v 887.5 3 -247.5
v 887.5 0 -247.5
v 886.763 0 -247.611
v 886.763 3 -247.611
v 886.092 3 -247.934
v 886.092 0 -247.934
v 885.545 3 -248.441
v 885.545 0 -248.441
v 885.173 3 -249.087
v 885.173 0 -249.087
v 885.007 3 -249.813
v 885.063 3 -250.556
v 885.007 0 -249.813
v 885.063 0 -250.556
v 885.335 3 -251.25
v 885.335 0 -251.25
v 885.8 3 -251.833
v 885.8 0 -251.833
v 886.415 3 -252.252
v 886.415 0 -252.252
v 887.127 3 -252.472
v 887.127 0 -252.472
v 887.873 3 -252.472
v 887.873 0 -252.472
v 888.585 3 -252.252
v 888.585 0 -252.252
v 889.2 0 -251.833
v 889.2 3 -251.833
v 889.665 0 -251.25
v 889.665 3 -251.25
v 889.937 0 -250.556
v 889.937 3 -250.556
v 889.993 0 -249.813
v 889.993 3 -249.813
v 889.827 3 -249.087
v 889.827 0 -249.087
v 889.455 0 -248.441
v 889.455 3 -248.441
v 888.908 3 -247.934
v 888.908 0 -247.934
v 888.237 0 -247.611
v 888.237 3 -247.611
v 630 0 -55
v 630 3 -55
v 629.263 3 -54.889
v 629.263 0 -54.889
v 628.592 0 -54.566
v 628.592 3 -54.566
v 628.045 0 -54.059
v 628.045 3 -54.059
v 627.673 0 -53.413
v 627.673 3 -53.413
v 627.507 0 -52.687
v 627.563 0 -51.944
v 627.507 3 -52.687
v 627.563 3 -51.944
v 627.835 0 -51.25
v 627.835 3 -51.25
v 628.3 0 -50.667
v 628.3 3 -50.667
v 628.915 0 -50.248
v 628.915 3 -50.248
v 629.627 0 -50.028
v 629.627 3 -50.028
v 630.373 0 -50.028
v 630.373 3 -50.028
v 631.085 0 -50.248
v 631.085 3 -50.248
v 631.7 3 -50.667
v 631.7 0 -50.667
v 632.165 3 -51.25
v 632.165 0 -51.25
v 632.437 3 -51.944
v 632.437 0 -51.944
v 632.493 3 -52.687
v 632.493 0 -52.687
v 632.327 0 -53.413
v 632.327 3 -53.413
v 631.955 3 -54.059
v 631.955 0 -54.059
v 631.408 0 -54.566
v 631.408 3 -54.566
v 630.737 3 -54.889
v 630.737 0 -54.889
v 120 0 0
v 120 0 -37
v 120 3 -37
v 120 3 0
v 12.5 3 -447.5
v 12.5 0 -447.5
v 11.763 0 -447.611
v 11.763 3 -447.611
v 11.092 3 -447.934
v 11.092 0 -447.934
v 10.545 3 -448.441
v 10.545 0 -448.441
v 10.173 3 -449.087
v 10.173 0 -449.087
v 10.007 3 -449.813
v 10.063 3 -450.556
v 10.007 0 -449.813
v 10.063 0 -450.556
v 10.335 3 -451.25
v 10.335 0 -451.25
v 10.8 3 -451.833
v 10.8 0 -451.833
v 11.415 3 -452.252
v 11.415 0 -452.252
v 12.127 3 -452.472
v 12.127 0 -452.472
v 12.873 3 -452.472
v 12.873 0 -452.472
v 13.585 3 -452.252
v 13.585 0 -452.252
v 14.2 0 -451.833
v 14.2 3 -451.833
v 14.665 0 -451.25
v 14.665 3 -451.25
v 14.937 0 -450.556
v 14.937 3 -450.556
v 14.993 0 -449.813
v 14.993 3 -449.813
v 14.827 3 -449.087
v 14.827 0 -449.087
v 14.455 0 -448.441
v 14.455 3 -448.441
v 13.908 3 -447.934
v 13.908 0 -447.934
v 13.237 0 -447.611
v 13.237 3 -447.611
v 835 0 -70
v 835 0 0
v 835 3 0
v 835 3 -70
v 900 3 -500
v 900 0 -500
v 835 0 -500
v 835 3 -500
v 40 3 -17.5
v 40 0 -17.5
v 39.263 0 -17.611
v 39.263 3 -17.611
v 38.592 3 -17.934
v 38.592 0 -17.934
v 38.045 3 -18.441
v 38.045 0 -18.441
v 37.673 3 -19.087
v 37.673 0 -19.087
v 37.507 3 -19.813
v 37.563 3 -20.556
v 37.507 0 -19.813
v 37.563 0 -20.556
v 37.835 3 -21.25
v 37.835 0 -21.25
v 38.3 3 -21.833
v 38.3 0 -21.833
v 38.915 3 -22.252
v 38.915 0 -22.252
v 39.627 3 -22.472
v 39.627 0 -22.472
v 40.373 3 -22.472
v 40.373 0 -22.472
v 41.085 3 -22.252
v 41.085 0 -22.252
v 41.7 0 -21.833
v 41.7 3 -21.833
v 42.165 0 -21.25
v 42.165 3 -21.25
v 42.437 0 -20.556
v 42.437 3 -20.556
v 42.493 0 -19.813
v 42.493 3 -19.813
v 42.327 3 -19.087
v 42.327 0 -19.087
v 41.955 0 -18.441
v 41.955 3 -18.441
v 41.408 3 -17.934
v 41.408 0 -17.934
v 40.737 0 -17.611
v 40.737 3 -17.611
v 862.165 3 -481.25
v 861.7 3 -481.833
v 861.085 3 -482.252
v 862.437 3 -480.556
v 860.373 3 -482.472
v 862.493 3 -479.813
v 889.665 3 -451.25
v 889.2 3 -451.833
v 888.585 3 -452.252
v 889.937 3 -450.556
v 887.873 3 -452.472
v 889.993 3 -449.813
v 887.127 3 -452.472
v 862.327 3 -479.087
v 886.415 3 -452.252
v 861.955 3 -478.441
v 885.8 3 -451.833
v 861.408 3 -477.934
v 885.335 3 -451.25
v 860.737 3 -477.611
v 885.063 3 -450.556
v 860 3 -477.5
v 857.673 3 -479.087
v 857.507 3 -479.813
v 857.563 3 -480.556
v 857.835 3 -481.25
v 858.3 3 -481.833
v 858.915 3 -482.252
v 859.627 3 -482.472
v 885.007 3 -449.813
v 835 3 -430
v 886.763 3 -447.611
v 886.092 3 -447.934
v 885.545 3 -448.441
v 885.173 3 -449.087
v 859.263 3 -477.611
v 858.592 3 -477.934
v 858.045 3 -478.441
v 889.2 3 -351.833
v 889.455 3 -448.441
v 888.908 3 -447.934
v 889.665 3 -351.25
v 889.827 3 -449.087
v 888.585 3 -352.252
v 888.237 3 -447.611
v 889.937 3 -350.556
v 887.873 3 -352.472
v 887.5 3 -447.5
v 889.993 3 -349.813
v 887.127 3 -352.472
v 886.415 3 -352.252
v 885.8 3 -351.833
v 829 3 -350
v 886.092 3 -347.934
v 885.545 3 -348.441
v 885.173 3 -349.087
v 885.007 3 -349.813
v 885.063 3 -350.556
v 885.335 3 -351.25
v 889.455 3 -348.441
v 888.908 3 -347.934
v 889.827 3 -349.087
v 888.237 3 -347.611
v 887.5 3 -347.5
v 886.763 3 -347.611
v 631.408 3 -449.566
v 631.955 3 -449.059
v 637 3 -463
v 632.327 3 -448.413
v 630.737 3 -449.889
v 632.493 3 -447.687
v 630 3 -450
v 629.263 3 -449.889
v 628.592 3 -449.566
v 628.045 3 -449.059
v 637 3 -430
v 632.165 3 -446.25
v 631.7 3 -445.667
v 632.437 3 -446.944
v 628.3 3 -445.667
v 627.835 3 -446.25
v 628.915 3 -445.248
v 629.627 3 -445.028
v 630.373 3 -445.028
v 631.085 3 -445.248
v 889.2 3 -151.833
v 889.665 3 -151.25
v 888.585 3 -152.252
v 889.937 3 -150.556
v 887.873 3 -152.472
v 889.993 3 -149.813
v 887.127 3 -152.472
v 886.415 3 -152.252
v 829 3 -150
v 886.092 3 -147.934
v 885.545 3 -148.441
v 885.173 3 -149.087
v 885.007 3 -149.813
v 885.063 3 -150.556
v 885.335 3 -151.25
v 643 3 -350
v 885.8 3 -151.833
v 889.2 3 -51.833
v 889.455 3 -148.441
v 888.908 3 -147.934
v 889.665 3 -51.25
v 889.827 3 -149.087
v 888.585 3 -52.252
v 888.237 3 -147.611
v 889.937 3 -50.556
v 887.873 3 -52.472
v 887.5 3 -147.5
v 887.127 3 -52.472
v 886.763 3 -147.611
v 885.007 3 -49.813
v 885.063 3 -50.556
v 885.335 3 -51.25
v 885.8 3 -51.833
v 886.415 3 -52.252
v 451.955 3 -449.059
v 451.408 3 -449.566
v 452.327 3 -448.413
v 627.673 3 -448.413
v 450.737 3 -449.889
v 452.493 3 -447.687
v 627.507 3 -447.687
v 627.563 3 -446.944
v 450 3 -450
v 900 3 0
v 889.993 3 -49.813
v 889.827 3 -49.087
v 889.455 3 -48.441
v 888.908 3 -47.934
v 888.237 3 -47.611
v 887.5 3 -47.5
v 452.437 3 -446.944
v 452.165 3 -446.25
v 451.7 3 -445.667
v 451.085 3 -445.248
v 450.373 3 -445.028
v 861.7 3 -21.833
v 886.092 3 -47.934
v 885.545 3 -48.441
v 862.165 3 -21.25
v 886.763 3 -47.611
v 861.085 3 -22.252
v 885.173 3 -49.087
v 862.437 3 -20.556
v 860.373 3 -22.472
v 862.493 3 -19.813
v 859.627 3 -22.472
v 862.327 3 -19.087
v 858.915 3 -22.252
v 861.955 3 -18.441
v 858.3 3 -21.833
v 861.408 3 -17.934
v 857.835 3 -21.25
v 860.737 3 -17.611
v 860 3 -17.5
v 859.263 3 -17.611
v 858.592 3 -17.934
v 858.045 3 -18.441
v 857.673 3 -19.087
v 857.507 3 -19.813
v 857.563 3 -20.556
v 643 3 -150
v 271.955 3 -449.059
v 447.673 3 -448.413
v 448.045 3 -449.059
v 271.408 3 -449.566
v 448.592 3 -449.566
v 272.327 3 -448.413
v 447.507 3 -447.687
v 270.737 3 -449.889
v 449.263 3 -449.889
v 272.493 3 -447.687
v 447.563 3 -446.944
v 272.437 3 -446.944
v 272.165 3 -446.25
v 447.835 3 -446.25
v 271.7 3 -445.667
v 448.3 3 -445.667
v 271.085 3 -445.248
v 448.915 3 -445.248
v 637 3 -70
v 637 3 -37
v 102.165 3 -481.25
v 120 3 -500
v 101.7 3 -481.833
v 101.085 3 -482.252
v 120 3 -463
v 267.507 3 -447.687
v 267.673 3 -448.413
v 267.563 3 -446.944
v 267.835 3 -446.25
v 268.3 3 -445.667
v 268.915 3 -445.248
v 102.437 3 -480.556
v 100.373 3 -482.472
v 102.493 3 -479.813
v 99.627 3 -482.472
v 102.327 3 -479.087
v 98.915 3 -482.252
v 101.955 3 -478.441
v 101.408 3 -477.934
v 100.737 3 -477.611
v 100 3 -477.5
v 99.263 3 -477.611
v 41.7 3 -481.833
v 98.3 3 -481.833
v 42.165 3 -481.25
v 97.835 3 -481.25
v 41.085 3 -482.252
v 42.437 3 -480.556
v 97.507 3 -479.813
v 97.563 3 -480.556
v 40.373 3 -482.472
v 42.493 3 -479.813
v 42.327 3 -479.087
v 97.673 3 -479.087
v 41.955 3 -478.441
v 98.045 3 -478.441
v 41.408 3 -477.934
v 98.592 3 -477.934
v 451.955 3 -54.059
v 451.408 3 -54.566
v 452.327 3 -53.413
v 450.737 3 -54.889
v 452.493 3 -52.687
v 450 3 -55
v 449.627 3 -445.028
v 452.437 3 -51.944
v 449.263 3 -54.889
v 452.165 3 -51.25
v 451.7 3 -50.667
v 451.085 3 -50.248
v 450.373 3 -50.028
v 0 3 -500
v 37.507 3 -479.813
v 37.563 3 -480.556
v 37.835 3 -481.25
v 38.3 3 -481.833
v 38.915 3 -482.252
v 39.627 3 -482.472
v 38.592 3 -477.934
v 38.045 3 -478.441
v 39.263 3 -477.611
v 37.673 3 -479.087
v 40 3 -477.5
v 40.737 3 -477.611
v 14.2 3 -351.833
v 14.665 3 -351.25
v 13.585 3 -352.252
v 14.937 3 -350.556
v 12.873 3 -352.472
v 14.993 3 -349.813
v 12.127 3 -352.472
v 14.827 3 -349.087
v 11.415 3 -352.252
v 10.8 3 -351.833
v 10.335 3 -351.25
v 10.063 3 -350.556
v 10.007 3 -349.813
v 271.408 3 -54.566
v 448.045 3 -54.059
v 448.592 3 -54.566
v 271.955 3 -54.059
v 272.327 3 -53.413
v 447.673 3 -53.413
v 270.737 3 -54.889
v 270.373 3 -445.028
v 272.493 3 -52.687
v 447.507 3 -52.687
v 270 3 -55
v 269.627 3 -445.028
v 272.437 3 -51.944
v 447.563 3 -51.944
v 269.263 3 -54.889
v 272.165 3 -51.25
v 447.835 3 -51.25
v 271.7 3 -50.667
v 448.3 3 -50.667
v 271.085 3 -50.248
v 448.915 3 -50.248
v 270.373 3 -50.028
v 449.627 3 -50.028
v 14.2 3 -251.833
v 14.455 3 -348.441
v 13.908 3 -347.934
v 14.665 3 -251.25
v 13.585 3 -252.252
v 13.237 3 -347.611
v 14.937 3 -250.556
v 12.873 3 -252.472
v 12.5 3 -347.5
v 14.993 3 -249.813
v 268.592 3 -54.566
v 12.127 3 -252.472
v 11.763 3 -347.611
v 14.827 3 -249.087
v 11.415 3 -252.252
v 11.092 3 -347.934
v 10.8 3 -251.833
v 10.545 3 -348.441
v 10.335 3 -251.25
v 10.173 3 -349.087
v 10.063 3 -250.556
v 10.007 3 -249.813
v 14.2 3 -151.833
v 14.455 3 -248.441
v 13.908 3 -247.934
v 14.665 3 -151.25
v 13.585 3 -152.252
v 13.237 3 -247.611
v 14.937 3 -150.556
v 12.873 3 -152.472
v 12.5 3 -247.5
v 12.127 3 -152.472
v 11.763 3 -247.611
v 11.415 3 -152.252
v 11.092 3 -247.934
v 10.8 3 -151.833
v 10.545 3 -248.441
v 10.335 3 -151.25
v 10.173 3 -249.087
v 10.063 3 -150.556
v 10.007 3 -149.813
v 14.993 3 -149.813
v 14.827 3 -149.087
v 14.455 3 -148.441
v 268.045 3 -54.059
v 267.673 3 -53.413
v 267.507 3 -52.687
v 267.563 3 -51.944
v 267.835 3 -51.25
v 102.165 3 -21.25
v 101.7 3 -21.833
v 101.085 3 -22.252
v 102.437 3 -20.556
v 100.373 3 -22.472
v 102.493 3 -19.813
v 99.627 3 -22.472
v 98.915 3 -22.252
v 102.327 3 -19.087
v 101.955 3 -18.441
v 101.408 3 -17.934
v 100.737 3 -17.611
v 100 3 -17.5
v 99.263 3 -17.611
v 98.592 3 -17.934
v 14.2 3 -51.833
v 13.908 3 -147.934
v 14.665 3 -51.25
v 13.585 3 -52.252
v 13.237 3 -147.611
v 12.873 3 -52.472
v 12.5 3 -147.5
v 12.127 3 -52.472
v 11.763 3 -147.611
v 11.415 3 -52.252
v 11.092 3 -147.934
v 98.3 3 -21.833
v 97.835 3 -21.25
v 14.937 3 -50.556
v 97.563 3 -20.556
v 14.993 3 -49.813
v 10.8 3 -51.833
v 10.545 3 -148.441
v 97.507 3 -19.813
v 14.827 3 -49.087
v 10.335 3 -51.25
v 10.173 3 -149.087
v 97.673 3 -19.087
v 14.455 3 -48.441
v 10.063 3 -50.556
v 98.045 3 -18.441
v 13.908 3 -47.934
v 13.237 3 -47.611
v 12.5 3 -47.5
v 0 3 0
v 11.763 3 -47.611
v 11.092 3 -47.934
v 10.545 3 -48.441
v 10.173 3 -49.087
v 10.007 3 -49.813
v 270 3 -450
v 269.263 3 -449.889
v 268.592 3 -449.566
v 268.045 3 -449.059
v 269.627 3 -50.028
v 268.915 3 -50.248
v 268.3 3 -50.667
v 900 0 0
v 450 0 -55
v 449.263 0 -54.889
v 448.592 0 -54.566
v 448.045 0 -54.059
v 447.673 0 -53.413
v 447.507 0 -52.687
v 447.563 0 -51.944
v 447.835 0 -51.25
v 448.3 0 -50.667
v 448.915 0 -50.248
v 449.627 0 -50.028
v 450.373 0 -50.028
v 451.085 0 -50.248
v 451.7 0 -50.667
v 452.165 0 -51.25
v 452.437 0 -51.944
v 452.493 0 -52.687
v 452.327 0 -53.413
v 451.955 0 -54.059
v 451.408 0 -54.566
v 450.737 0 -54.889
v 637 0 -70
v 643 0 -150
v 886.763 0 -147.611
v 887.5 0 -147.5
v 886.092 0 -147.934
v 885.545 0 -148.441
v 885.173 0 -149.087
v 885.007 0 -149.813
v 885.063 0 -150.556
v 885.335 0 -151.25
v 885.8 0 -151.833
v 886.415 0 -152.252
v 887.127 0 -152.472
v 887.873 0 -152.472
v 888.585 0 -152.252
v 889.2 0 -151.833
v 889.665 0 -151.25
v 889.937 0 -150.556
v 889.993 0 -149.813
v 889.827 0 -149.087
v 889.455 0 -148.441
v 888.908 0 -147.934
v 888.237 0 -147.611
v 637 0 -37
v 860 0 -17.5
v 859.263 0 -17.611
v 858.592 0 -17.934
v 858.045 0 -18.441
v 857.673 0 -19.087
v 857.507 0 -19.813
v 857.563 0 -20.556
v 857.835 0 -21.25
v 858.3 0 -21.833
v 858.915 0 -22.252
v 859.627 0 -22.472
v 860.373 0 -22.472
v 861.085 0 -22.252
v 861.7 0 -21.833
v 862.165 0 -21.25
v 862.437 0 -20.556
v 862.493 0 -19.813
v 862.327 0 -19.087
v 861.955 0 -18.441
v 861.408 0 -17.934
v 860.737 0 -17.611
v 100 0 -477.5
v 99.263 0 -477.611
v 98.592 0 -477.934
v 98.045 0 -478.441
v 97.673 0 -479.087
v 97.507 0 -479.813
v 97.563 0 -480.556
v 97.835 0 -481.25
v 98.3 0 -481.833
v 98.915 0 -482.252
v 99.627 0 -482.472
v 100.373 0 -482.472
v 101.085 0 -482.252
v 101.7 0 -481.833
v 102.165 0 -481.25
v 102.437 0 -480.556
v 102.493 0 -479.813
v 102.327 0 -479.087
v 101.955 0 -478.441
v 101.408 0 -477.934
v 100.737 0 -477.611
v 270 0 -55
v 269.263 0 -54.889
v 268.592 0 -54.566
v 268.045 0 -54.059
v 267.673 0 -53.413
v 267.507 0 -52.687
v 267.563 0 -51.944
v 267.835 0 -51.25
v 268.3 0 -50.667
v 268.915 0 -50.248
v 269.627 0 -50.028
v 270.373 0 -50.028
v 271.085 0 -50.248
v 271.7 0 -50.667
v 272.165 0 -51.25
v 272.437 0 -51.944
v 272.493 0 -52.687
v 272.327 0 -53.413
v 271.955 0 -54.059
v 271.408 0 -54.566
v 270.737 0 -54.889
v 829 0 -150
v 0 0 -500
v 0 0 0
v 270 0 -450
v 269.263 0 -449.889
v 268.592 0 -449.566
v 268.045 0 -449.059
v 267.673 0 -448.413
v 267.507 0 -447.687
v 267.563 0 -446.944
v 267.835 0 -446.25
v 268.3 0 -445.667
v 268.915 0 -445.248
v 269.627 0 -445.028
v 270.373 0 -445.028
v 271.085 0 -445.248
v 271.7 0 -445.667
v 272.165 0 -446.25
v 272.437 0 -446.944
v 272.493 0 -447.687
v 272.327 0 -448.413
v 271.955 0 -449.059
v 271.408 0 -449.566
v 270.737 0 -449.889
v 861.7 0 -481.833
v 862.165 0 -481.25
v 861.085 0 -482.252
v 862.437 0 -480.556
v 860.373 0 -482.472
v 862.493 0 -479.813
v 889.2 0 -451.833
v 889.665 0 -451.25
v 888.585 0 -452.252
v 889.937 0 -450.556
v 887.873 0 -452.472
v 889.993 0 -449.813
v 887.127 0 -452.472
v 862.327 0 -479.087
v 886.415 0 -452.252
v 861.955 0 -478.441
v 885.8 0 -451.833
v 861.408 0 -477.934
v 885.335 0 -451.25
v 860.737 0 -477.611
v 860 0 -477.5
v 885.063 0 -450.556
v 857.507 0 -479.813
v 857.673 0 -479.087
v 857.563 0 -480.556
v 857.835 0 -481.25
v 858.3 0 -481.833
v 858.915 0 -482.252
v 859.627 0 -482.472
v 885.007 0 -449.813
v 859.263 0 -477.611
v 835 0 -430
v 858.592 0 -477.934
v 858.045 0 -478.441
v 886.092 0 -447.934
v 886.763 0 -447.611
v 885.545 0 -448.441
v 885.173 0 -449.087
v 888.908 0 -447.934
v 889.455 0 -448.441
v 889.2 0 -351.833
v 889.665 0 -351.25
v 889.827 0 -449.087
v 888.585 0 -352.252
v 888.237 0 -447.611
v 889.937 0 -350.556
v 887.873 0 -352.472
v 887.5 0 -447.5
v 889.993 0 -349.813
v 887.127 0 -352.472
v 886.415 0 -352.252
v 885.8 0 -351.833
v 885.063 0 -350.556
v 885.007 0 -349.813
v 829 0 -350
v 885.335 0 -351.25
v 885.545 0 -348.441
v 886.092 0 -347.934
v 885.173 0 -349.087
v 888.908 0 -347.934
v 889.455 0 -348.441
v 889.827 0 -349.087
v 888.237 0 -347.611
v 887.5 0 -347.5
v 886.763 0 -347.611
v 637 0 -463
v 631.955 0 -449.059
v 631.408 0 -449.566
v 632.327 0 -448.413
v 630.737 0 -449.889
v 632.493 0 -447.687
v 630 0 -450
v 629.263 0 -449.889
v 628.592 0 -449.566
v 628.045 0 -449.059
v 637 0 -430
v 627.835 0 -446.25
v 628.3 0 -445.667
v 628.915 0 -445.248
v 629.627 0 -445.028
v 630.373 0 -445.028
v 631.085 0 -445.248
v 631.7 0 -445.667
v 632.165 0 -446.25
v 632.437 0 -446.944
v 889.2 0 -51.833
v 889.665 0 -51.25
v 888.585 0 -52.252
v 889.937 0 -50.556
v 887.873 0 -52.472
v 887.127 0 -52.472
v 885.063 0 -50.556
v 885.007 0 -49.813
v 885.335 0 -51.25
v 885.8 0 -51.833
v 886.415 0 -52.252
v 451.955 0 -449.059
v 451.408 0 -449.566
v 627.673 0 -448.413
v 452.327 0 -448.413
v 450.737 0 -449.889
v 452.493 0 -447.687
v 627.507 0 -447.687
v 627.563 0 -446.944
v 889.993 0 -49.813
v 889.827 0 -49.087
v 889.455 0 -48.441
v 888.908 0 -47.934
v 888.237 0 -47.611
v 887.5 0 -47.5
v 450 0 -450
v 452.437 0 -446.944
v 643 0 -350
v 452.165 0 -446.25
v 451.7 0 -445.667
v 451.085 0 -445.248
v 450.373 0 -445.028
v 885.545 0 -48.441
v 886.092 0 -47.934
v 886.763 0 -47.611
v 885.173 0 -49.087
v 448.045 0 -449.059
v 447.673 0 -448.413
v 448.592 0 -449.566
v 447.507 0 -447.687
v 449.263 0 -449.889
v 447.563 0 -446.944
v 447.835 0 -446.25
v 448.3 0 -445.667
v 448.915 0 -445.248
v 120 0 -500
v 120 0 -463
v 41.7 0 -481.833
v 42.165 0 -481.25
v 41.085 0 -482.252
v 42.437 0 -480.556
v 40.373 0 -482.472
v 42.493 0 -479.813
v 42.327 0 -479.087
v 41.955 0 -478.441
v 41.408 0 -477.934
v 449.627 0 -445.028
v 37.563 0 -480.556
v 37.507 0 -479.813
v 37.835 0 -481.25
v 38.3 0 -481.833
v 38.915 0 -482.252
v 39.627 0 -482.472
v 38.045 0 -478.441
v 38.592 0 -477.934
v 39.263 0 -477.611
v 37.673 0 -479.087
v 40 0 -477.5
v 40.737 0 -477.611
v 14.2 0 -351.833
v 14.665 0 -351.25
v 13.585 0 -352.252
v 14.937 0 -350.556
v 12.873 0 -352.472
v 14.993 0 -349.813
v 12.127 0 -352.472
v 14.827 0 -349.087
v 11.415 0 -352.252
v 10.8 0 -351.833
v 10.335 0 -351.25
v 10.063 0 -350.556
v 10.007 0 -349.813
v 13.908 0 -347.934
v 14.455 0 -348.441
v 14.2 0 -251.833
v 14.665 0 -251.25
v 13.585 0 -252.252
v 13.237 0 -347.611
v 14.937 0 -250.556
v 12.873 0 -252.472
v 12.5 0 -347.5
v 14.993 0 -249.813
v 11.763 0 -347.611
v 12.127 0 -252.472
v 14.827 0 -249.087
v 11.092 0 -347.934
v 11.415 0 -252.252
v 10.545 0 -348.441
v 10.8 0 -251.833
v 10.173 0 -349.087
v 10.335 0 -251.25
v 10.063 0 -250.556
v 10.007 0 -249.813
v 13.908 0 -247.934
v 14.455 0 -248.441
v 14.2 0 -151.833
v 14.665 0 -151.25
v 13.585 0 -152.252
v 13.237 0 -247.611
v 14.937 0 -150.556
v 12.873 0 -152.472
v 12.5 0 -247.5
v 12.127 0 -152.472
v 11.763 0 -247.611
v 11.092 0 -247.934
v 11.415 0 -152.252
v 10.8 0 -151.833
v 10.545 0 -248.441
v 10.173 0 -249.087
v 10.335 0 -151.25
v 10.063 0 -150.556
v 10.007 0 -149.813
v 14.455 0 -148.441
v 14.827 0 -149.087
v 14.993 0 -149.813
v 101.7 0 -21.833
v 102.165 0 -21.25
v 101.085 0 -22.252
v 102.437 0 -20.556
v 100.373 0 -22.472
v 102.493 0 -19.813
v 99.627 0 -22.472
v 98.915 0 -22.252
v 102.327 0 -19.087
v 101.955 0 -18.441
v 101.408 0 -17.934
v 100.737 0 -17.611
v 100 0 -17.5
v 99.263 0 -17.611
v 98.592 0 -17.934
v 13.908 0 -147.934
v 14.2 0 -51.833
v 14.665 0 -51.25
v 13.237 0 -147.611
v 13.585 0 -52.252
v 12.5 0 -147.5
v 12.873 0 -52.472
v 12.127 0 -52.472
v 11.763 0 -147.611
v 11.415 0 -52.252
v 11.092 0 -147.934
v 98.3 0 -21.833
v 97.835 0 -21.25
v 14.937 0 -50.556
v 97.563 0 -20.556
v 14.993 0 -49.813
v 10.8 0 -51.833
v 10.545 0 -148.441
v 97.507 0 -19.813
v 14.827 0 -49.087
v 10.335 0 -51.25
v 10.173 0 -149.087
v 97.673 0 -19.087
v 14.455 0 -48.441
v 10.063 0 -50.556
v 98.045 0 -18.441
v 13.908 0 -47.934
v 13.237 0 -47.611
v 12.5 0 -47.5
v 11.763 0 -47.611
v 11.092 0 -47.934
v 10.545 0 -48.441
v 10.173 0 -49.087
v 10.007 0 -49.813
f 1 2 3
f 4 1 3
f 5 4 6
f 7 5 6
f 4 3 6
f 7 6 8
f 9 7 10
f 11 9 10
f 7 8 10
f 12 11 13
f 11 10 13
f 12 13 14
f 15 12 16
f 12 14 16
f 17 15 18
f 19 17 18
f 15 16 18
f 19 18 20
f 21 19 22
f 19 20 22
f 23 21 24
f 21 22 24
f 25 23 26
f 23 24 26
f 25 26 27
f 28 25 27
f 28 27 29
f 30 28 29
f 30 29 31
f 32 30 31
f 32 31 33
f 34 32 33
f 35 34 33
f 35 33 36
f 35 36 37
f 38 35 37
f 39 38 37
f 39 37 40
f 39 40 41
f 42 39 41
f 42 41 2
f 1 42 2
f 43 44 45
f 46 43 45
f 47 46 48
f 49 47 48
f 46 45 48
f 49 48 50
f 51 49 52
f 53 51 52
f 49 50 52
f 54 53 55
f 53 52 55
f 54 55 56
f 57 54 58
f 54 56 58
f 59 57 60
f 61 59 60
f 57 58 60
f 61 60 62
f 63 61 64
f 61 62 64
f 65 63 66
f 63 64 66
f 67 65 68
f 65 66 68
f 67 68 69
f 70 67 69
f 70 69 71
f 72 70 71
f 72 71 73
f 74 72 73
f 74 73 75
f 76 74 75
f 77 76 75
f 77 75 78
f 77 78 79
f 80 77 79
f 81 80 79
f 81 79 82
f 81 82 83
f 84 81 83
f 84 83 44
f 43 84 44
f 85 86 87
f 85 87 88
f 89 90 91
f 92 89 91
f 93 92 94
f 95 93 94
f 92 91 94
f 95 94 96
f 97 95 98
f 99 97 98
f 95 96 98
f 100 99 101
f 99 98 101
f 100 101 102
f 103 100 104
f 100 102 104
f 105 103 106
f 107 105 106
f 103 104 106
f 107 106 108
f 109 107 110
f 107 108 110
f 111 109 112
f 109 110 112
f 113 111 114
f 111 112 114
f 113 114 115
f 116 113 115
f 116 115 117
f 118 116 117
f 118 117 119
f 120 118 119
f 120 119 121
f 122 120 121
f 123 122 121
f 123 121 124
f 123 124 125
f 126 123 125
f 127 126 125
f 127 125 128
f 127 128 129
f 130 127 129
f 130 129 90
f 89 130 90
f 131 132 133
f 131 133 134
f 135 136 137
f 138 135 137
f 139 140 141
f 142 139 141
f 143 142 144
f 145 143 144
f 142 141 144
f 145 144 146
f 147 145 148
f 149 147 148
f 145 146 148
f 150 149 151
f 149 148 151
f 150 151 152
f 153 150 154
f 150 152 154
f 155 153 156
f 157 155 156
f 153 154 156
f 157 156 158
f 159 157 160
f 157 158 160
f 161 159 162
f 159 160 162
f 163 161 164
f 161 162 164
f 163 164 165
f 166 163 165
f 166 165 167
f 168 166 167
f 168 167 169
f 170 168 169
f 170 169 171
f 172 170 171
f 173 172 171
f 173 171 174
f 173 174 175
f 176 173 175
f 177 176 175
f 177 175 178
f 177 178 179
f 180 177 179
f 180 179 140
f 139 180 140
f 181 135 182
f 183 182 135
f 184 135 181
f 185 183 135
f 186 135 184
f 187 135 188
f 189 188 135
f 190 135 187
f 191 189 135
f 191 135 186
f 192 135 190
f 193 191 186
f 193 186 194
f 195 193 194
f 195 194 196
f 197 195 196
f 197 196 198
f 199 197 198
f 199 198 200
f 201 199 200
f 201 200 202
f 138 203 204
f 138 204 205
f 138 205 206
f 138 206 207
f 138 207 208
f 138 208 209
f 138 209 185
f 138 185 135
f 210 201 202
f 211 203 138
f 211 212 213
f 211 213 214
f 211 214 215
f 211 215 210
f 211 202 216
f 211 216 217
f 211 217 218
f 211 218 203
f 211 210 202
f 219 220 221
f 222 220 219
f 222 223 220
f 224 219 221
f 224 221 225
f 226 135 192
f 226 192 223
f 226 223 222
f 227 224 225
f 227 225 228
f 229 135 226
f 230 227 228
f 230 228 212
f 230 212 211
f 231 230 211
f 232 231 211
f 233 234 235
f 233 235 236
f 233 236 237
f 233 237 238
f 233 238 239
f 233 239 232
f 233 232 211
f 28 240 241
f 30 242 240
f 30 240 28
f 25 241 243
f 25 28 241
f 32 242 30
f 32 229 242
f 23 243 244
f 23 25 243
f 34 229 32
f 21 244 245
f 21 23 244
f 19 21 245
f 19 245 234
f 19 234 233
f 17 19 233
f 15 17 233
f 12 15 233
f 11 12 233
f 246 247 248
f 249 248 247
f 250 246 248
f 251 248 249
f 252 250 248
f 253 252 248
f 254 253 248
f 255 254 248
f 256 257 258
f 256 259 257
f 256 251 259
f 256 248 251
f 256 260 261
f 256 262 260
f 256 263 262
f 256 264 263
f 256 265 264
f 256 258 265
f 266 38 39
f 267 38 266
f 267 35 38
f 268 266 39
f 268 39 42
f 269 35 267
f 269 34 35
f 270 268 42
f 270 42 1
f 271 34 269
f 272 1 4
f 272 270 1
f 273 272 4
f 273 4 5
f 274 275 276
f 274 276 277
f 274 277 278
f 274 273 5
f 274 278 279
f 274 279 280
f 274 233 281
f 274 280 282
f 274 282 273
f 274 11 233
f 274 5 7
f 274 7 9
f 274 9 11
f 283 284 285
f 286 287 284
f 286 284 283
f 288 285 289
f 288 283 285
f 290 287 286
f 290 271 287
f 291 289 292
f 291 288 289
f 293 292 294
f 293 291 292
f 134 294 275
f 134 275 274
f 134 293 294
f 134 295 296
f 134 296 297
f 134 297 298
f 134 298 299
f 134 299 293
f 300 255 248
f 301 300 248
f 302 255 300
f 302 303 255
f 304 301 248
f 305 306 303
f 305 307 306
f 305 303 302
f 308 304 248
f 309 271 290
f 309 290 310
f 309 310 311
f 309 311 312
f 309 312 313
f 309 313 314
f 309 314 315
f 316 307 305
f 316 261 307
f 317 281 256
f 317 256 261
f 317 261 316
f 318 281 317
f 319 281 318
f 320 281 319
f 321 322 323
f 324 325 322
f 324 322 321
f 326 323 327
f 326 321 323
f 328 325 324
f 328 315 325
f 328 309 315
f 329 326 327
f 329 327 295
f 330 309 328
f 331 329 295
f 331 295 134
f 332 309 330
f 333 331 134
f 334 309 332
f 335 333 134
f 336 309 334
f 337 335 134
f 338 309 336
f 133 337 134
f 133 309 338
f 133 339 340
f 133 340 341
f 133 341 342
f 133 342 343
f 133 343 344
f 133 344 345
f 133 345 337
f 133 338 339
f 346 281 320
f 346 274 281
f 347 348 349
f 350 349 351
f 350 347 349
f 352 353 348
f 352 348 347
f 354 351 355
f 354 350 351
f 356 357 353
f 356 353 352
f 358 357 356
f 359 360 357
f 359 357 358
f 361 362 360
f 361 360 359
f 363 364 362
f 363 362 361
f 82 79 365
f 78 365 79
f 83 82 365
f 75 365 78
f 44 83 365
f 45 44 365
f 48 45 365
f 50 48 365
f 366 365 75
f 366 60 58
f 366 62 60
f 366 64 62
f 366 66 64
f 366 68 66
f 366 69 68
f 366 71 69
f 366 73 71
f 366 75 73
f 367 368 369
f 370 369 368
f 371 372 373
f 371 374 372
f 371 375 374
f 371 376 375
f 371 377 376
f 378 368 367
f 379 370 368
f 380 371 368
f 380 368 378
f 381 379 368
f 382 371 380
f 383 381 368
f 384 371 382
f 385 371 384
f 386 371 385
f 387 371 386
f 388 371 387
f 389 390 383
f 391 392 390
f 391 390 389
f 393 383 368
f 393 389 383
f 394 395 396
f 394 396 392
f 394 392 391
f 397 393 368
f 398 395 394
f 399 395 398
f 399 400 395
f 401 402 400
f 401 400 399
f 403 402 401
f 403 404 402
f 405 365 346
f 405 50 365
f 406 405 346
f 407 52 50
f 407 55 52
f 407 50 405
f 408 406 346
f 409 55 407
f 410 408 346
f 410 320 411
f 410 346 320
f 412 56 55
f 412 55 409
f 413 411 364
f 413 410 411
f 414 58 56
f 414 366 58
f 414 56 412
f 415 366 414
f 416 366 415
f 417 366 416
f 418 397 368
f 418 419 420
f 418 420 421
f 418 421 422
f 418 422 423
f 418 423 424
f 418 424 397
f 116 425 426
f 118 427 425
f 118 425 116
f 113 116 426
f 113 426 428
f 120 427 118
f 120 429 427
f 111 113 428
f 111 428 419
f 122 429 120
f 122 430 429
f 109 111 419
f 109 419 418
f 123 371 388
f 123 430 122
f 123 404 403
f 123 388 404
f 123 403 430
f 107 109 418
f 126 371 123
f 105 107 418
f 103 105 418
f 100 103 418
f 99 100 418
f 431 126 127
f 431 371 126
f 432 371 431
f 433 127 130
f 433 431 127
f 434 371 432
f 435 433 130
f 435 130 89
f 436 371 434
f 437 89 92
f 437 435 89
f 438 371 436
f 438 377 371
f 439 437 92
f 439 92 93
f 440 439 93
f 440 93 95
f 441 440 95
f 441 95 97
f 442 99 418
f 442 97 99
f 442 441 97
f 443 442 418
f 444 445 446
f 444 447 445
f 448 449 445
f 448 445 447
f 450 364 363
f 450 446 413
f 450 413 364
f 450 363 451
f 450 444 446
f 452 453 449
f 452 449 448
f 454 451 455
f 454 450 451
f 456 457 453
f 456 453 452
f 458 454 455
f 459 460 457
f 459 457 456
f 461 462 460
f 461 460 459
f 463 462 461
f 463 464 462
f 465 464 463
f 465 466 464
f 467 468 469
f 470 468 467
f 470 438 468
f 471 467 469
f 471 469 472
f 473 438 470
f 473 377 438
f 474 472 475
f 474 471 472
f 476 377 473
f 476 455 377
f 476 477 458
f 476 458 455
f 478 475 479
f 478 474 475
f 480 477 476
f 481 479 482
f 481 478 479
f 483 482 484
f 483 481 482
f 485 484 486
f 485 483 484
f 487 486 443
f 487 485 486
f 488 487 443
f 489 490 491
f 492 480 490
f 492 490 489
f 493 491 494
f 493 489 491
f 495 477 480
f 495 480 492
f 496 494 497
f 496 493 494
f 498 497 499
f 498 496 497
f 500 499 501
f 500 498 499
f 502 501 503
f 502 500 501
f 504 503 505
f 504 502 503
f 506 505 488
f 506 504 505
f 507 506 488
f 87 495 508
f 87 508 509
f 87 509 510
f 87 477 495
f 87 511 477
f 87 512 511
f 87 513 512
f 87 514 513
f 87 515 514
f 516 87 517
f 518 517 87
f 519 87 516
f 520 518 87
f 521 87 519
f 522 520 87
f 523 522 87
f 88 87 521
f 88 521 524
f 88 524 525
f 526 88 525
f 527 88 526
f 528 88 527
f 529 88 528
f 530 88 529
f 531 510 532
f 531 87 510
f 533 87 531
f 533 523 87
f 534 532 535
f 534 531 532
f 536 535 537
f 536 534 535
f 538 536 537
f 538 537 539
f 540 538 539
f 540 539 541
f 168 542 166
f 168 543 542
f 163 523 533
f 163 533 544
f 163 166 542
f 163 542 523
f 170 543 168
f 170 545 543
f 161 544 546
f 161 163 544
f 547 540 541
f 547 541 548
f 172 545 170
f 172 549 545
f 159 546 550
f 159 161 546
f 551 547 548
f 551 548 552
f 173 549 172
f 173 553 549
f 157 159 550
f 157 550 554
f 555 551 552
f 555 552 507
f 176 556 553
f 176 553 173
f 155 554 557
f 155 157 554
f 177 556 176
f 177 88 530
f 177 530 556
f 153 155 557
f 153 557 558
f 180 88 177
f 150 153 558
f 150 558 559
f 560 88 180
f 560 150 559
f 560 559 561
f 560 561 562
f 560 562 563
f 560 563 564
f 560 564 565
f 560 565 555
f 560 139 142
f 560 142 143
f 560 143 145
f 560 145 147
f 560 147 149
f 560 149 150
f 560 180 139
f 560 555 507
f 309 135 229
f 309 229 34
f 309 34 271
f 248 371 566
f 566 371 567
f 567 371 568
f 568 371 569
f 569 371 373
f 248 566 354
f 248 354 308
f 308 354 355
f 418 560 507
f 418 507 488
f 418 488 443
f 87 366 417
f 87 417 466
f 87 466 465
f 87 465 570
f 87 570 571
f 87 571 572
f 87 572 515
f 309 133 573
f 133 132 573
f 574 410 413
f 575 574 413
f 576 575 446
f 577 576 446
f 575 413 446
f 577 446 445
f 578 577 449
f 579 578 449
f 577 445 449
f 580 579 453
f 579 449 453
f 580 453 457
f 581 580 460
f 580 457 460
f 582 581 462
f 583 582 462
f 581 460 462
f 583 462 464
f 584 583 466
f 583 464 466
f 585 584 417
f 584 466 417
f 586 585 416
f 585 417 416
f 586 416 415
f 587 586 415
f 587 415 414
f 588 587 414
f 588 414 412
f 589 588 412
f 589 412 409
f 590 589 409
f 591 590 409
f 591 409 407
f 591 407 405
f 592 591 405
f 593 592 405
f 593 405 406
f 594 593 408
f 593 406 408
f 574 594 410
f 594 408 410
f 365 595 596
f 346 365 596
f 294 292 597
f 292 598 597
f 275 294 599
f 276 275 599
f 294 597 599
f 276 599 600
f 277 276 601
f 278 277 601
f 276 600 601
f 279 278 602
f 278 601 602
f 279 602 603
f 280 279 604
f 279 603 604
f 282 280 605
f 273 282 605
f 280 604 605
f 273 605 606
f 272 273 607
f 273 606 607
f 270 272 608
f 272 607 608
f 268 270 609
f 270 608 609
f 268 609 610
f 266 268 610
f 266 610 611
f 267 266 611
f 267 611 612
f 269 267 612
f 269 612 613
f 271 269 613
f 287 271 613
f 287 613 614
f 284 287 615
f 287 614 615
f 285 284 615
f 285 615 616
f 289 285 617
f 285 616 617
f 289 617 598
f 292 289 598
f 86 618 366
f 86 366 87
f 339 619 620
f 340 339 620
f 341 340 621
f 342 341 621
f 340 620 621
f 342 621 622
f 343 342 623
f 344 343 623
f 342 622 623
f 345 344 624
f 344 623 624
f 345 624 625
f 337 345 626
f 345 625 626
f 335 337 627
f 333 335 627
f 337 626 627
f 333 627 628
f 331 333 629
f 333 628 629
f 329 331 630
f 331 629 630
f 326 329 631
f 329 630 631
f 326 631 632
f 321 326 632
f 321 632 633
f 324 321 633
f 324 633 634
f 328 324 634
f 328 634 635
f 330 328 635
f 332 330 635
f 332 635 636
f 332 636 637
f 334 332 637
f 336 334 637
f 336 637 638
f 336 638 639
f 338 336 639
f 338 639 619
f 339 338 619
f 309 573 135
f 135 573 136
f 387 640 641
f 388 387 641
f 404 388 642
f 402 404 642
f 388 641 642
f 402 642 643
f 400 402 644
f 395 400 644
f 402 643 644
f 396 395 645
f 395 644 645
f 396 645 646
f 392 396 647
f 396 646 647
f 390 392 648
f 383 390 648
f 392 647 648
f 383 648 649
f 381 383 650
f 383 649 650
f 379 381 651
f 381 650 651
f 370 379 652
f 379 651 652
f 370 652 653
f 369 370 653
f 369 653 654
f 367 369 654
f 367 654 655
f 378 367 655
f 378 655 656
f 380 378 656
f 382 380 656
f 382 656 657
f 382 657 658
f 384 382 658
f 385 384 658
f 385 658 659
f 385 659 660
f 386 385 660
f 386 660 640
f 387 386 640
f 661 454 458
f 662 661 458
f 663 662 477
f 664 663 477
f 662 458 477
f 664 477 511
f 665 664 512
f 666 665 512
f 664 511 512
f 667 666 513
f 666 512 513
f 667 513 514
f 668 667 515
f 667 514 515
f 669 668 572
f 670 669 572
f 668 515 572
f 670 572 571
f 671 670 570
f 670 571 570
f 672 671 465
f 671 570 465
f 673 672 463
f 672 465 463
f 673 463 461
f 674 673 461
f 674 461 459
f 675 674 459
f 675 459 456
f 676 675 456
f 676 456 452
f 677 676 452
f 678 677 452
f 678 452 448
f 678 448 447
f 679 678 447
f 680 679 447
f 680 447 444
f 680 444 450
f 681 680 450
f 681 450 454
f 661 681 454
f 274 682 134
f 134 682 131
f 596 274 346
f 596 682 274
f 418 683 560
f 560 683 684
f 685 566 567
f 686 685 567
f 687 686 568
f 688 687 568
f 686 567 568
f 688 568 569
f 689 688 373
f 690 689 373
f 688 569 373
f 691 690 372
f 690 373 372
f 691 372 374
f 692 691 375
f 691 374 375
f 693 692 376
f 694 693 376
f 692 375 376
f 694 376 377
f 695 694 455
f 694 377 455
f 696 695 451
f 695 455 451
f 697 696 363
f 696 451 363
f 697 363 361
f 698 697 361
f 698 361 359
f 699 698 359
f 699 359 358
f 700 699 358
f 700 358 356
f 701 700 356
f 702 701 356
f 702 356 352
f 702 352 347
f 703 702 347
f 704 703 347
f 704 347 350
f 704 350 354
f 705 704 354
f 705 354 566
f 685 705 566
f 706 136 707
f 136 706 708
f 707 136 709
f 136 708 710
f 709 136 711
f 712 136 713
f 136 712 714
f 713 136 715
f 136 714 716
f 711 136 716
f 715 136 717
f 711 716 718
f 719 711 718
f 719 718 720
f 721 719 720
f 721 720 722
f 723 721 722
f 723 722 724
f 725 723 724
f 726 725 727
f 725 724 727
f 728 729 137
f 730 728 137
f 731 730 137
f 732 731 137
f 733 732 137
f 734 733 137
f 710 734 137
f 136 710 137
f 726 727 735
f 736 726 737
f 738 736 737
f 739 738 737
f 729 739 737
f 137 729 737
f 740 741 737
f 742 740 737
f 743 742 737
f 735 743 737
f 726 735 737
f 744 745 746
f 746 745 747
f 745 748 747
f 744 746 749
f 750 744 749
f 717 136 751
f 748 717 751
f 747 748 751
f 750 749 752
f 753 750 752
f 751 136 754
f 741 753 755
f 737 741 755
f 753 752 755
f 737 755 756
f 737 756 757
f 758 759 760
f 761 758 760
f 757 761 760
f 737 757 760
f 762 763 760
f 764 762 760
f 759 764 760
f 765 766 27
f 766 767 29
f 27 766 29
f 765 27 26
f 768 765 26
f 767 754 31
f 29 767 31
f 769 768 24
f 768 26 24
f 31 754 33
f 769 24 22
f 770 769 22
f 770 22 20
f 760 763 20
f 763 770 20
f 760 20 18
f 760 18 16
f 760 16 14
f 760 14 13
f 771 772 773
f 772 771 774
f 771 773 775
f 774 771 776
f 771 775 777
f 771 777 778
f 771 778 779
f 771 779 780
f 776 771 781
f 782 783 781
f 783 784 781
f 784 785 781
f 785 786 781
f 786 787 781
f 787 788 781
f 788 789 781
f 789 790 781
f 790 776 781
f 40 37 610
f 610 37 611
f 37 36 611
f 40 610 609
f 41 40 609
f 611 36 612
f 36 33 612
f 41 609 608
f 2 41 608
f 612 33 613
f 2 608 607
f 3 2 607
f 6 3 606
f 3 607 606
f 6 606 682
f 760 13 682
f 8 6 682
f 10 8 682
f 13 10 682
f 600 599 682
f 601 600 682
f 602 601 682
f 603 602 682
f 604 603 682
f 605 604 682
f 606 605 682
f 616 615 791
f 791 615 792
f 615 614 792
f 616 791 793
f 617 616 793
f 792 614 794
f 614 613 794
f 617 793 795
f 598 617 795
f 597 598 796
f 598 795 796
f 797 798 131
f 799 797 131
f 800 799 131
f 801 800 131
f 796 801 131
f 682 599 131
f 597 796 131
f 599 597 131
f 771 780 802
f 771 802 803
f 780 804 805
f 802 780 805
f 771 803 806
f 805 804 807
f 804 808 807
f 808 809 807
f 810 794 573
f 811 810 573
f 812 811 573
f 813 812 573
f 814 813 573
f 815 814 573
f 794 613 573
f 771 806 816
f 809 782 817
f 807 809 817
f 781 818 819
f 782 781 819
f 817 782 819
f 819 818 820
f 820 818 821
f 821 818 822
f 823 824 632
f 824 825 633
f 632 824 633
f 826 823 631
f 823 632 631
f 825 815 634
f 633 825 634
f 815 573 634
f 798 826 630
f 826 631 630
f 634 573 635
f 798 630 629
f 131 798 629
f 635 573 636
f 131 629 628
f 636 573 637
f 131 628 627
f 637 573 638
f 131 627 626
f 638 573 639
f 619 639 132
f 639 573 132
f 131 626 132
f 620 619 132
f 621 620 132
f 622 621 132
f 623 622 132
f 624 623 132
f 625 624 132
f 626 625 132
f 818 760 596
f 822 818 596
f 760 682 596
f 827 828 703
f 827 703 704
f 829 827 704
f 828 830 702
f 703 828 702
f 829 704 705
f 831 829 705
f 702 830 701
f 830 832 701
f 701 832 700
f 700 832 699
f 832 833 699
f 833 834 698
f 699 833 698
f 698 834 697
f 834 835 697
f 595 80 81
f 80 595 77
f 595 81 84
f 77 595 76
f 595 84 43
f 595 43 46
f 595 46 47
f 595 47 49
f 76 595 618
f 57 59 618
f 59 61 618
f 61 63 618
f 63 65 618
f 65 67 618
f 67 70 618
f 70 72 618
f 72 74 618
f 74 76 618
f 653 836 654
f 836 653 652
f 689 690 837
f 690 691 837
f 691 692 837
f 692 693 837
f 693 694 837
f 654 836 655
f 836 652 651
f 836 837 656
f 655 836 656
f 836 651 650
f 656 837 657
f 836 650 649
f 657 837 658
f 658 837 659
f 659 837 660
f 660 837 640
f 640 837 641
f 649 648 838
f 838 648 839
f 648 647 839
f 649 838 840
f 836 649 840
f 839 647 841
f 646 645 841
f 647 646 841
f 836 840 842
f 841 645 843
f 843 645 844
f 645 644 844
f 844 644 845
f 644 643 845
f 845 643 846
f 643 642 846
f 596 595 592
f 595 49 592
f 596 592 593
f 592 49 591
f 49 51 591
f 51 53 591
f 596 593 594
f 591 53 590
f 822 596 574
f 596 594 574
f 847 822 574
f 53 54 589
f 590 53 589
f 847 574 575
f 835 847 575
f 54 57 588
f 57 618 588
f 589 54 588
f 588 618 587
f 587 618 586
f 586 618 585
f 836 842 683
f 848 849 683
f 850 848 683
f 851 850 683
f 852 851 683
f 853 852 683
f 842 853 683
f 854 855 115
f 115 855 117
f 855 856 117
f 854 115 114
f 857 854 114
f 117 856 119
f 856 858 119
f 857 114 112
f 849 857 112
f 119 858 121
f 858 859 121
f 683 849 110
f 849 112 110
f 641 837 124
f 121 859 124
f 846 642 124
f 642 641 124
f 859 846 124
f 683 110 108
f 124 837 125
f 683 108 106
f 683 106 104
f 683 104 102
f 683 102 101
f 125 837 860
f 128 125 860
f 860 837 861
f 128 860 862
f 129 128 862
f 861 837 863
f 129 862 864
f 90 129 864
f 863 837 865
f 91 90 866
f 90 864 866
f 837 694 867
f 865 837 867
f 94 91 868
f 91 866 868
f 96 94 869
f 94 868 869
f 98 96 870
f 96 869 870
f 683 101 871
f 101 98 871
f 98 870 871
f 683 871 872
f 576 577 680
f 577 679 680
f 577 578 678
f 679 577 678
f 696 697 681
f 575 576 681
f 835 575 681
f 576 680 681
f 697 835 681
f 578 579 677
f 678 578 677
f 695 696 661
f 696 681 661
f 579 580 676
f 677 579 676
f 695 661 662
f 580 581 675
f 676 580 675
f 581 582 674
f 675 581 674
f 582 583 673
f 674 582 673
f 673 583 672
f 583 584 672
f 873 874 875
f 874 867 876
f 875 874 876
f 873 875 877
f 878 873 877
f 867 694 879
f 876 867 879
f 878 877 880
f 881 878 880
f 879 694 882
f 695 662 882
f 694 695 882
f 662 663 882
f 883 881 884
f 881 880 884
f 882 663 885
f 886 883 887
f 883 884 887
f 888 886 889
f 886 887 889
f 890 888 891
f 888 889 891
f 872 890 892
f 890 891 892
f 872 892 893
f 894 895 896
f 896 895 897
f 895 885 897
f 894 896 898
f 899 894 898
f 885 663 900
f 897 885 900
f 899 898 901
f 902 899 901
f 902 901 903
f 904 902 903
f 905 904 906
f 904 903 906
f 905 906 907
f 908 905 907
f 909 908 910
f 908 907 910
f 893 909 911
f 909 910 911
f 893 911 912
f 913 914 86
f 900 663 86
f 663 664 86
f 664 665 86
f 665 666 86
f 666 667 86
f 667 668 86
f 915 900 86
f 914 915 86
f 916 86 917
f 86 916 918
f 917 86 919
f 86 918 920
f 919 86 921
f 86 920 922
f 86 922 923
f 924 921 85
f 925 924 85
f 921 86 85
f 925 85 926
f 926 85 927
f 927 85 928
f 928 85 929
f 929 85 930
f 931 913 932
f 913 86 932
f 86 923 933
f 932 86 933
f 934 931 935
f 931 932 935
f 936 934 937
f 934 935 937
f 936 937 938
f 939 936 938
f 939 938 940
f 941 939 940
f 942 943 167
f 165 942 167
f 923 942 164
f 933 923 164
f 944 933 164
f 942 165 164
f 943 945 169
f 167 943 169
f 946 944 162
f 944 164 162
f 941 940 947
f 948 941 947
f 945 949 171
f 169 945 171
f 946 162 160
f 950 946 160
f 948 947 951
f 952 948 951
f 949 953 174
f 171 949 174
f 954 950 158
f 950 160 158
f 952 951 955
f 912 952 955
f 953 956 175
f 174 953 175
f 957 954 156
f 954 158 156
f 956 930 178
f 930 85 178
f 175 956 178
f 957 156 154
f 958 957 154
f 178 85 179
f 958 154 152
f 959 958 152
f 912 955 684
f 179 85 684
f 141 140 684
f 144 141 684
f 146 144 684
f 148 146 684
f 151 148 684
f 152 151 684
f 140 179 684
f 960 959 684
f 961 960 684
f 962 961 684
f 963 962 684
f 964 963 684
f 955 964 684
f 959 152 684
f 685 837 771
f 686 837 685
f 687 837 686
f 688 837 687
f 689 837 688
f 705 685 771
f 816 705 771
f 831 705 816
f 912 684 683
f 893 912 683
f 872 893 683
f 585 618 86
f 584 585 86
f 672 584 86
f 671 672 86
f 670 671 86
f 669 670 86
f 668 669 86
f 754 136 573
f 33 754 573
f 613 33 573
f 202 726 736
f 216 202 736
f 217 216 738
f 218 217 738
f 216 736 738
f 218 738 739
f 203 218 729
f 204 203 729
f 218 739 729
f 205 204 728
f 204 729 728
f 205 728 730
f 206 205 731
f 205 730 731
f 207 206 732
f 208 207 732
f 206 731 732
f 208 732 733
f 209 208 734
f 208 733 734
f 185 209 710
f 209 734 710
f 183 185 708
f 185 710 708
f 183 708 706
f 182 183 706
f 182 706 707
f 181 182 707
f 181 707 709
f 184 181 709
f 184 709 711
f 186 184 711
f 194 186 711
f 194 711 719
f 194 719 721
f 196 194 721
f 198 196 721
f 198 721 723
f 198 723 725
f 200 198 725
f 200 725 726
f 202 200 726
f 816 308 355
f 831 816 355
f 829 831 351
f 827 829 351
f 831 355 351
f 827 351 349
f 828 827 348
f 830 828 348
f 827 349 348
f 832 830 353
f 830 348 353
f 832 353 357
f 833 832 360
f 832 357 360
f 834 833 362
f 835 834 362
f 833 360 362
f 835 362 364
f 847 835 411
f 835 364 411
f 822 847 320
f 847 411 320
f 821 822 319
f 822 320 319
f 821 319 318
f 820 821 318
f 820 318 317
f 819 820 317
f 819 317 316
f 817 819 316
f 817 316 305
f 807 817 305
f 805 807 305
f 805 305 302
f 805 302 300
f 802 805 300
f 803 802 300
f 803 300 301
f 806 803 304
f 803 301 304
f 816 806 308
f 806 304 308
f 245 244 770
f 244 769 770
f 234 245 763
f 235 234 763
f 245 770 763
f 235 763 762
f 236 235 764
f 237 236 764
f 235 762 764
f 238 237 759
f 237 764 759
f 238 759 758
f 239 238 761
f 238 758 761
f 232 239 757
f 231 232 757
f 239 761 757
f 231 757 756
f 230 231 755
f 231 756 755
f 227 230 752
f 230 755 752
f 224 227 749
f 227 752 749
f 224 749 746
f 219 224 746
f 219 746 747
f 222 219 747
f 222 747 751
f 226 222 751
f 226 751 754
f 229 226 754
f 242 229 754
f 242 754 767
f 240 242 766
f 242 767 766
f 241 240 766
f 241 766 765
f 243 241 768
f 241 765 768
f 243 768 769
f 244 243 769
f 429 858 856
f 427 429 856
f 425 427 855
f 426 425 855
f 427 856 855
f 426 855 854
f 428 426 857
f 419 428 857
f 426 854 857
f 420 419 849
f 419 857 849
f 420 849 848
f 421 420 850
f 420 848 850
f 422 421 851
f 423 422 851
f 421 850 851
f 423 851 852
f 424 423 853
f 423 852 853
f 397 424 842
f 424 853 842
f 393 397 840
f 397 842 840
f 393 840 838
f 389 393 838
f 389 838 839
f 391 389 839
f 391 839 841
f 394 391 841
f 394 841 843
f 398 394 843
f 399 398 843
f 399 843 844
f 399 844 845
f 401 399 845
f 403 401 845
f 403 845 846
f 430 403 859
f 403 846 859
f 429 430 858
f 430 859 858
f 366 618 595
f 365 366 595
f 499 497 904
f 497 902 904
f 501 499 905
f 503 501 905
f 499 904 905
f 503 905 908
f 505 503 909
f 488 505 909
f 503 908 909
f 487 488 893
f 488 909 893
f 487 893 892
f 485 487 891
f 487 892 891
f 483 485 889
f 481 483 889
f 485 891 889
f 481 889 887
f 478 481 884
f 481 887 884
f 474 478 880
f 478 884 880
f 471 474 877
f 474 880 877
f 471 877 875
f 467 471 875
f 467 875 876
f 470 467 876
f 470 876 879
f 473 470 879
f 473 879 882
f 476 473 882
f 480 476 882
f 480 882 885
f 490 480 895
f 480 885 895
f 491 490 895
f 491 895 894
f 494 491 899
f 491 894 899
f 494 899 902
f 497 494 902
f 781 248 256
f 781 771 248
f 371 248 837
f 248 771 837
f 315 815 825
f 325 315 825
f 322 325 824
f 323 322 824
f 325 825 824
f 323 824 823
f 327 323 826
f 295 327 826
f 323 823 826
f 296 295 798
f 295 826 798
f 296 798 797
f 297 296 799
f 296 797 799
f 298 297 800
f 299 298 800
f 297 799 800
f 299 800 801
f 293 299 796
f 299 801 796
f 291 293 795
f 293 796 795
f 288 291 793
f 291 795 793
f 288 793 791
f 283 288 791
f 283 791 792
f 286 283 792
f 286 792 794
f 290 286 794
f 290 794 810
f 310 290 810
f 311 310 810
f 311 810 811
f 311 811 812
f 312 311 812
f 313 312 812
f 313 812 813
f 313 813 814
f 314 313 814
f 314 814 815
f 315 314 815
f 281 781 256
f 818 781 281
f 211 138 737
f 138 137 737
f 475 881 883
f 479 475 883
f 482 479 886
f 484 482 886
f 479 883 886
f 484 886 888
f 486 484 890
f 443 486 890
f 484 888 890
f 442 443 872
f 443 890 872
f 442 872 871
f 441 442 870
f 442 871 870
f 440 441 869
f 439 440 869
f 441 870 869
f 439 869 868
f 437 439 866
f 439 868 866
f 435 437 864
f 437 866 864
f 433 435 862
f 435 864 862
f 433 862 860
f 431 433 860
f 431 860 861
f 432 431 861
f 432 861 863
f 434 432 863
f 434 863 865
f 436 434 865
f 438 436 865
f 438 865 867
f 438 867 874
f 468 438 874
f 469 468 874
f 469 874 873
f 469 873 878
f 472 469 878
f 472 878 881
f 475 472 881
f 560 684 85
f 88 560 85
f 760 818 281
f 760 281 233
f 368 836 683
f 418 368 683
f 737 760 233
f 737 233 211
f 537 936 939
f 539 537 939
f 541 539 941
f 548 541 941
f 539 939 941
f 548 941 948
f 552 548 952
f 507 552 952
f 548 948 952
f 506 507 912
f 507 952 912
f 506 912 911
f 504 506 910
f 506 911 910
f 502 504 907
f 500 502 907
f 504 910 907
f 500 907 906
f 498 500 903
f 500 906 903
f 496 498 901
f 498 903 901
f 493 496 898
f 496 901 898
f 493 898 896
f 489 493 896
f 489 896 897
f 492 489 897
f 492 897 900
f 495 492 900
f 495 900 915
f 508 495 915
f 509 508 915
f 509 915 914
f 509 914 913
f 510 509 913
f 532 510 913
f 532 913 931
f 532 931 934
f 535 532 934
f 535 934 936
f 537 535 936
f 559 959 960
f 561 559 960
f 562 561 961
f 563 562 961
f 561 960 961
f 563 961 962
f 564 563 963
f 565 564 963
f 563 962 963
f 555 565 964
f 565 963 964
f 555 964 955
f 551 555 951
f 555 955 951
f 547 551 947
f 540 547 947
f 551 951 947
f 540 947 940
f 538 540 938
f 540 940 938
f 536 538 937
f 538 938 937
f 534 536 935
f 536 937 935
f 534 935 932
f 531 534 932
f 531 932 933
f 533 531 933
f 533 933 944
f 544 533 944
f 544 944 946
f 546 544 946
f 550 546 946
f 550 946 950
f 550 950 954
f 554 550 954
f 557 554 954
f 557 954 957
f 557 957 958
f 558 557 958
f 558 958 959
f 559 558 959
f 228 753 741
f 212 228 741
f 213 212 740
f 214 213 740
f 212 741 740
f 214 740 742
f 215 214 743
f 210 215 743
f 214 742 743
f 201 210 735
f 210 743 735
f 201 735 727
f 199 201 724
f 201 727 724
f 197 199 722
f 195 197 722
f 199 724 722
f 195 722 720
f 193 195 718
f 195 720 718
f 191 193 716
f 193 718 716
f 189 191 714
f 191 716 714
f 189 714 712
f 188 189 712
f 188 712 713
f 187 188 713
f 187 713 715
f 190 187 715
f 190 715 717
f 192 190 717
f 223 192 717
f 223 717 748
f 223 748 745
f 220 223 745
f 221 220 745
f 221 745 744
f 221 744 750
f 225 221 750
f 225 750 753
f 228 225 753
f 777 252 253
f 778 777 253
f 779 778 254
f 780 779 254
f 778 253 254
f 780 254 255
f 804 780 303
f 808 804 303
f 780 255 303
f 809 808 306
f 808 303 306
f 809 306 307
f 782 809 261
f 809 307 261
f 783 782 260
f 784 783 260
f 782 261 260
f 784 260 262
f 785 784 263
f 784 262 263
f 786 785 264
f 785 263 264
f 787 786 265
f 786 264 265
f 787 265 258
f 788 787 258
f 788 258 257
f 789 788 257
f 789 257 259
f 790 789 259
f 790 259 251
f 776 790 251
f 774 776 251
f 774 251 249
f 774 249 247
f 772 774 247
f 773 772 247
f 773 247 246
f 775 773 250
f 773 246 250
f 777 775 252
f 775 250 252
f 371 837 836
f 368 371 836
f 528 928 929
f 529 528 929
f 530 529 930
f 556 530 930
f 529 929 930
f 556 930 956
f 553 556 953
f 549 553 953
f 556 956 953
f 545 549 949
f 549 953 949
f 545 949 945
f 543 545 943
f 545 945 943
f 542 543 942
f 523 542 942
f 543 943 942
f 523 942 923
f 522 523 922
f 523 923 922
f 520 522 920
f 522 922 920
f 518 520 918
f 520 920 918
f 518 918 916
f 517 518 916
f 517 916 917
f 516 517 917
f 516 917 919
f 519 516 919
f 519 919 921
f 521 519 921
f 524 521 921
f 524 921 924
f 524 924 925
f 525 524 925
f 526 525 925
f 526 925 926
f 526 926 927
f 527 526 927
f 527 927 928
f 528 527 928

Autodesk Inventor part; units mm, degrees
ref_plane "YZ Plane" through (0, 0, 0) normal (1, 0, 0) x (0, 1, 0)
ref_plane "XZ Plane" through (0, 0, 0) normal (0, 1, 0) x (-1, 0, 0)
ref_plane "XY Plane" through (0, 0, 0) normal (0, 0, 1) x (1, 0, 0)
sketch "Sketch2" plane through (0, 0, 0) normal (0, 1, 0) x (-1, 0, 0)
  line L0 (0, 0) -> (-900, 0)
  line L1 (-900, 0) -> (-900, -500)
  line L2 (-900, -500) -> (0, -500)
  line L3 (0, -500) -> (0, 0)
  line L4 (-120, -500) -> (-780, -500)
  line L5 (-780, -500) -> (-780, -463)
  line L6 (-780, -463) -> (-120, -463)
  line L7 (-120, -463) -> (-120, -500)
  line L8 (-120, 0) -> (-780, 0)
  line L9 (-780, 0) -> (-780, -37)
  line L10 (-780, -37) -> (-120, -37)
  line L11 (-120, -37) -> (-120, 0)
  line L12 (-764, -430) -> (-829, -430)
  line L13 (-829, -430) -> (-829, -350)
  line L14 (-829, -350) -> (-764, -350)
  line L15 (-764, -350) -> (-764, -430)
  line L16 (-740, -463) -> (-835, -463)
  line L17 (-835, -463) -> (-835, -430)
  line L18 (-835, -430) -> (-740, -430)
  line L19 (-740, -430) -> (-740, -463)
  line L20 (-740, -430) -> (-764, -350)
  line L21 (-829, -350) -> (-835, -430)
  line L22 (-780, -500) -> (-835, -500)
  line L23 (-835, -500) -> (-835, -463)
  line L24 (-835, -463) -> (-780, -463)
  line L25 (-780, -463) -> (-780, -500)
  line L26 (0, -250) -> (-900, -250)
  line L27 (-829, -150) -> (-764, -150)
  line L28 (-835, -37) -> (-835, -70)
  line L29 (-740, -70) -> (-740, -37)
  line L30 (-740, -70) -> (-764, -150)
  line L31 (-829, -150) -> (-835, -70)
  line L32 (-835, 0) -> (-835, -37)
  point P0 (-780, -463)
  point P1 (-740, -37)
  dimension "d7" = 900
  dimension "d8" = 500
  dimension "d11" = 37
  dimension "d12" = 120
  dimension "d13" = 120
  dimension "d14" = 33
  dimension "d15" = 55
  dimension "d16" = 40
  dimension "d17" = 65
  dimension "d18" = 6
  dimension "d19" = 80
extrude "Extrusion2" add sketch "Sketch2" along normal blind 3 contours L3 L26 L1 L0 L32 L28 L31 L27 L30 L29 L10 L11 | L3 L2 L7 L6 L19 L20 L14 L21 L17 L23 L1 L26
sketch "Sketch3" plane through (0, 3, 0) normal (0, 1, 0) x (1, 0, 0)
  line L0 (0, 500) -> (0, 0) projected
  line L1 (0, 0) -> (120, 0) projected
  line L2 (120, 500) -> (0, 500) projected
  line L3 (900, 0) -> (900, 500) projected
  point P0 (40, 20)
  point P1 (100, 20)
  point P2 (40, 480)
  point P3 (100, 480)
  point P4 (12.5, 450)
  point P5 (860, 480)
  point P6 (860, 20)
  point P7 (887.5, 450)
  point P8 (12.5, 350)
  point P9 (887.5, 350)
  point P10 (12.5, 250)
  point P11 (887.5, 250)
  point P12 (12.5, 150)
  point P13 (887.5, 150)
  point P14 (12.5, 50)
  point P15 (887.5, 50)
  dimension "d20" = 40
  dimension "d21" = 100
  dimension "d22" = 20
  dimension "d23" = 20
  dimension "d24" = 12.5
  dimension "d25" = 50
  dimension "d33" = 40
  dimension "d34" = 12.5
  dimension "d37" = 100
  dimension "d64" = 50
hole "Hole1" at (40, 3, -20) at (100, 3, -20) at (40, 3, -480) at (100, 3, -480) at (12.5, 3, -450) at (860, 3, -480) at (860, 3, -20) at (887.5, 3, -450) at (12.5, 3, -350) at (887.5, 3, -350) at (12.5, 3, -250) at (887.5, 3, -250) at (12.5, 3, -150) at (887.5, 3, -150) at (12.5, 3, -50) at (887.5, 3, -50) direction (0, -1, 0) diameter 5 end through all
sketch "Sketch4" plane through (0, 0, 0) normal (0, -1, 0) x (1, 0, 0)
  line L0 (120, -37) -> (740, -37) projected
  line L1 (740, -463) -> (120, -463) projected
  line L2 (900, 0) -> (900, -500) projected
  point P0 (0, 0)
  point P1 (630, -447.5)
  point P2 (450, -447.5)
  point P3 (270, -447.5)
  point P4 (270, -52.5)
  point P5 (450, -52.5)
  point P6 (630, -52.5)
  dimension "d49" = 15.5
  dimension "d50" = 15.5
  dimension "d51" = 180
  dimension "d52" = 180
  dimension "d53" = 450
hole "Hole2" at (630, 0, -447.5) at (450, 0, -447.5) at (270, 0, -447.5) at (270, 0, -52.5) at (450, 0, -52.5) at (630, 0, -52.5) direction (0, 1, 0) diameter 5 depth 8 tip angle 118
sketch "Sketch5" plane through (0, 0, 0) normal (0, -1, 0) x (1, 0, 0)
  circle A0 centre (450, -52.5) radius 2.5 projected
  circle A1 centre (270, -447.5) radius 2.5 projected
  circle A2 centre (630, -447.5) radius 2.5 projected
  circle A3 centre (450, -447.5) radius 2.5 projected
  circle A4 centre (270, -52.5) radius 2.5 projected
  circle A5 centre (630, -52.5) radius 2.5 projected
  circle A6 centre (12.5, -50) radius 2.5 projected
  circle A7 centre (12.5, -150) radius 2.5 projected
  circle A8 centre (12.5, -250) radius 2.5 projected
  circle A9 centre (12.5, -350) radius 2.5 projected
  circle A10 centre (860, -20) radius 2.5 projected
  circle A11 centre (12.5, -450) radius 2.5 projected
  circle A12 centre (40, -480) radius 2.5 projected
  circle A13 centre (40, -20) radius 2.5 projected
  circle A14 centre (100, -20) radius 2.5 projected
  circle A15 centre (100, -480) radius 2.5 projected
  circle A16 centre (860, -480) radius 2.5 projected
  circle A17 centre (887.5, -450) radius 2.5 projected
  circle A18 centre (887.5, -350) radius 2.5 projected
  circle A19 centre (887.5, -250) radius 2.5 projected
  circle A20 centre (887.5, -150) radius 2.5 projected
  circle A21 centre (887.5, -50) radius 2.5 projected
  line L0 (835, -430) -> (829, -350) projected
  line L1 (835, -500) -> (835, -430) projected
  line L2 (900, -500) -> (835, -500) projected
  line L3 (900, 0) -> (900, -500) projected
  line L4 (835, 0) -> (900, 0) projected
  line L5 (835, -70) -> (835, 0) projected
  line L6 (829, -150) -> (835, -70) projected
  line L7 (764, -150) -> (829, -150) projected
  line L8 (740, -70) -> (764, -150) projected
  line L9 (740, -37) -> (740, -70) projected
  line L10 (120, -37) -> (740, -37) projected
  line L11 (120, 0) -> (120, -37) projected
  line L12 (0, 0) -> (120, 0) projected
  line L13 (0, -500) -> (0, 0) projected
  line L14 (120, -500) -> (0, -500) projected
  line L15 (120, -463) -> (120, -500) projected
  line L16 (740, -463) -> (120, -463) projected
  line L17 (740, -430) -> (740, -463) projected
  line L18 (764, -350) -> (740, -430) projected
  line L19 (829, -350) -> (764, -350) projected
  line L20 (740, -37) -> (740, -70) projected
  line L21 (740, -37) -> (637, -37)
  line L22 (637, -37) -> (637, -70)
  line L23 (637, -70) -> (740, -70)
  line L24 (740, -70) -> (740, -37)
  line L25 (637, -70) -> (643, -150)
  line L26 (829, -150) -> (835, -70) projected
  line L27 (764, -150) -> (829, -150) projected
  line L28 (643, -150) -> (764, -150)
  line L29 (0, -500) -> (0, 0) projected
  line L30 (0, -250) -> (900, -250)
  line L31 (637, -463) -> (637, -430)
  line L32 (637, -430) -> (643, -350)
  line L33 (643, -350) -> (764, -350)
  dimension "d61" = 103
extrude "Two Motor Cutout" cut sketch "Sketch5" against normal through all contours L31 L32 L33 L18 L17 L16 | L10 L9 L23 L22 | L23 L8 L28 L25
equation "\"d33\" = d20"
equation "\"d34\" = d24"
equation "\"d50\" = d49"
equation "\"d52\" = d51"
properties part number "Bellypan"
